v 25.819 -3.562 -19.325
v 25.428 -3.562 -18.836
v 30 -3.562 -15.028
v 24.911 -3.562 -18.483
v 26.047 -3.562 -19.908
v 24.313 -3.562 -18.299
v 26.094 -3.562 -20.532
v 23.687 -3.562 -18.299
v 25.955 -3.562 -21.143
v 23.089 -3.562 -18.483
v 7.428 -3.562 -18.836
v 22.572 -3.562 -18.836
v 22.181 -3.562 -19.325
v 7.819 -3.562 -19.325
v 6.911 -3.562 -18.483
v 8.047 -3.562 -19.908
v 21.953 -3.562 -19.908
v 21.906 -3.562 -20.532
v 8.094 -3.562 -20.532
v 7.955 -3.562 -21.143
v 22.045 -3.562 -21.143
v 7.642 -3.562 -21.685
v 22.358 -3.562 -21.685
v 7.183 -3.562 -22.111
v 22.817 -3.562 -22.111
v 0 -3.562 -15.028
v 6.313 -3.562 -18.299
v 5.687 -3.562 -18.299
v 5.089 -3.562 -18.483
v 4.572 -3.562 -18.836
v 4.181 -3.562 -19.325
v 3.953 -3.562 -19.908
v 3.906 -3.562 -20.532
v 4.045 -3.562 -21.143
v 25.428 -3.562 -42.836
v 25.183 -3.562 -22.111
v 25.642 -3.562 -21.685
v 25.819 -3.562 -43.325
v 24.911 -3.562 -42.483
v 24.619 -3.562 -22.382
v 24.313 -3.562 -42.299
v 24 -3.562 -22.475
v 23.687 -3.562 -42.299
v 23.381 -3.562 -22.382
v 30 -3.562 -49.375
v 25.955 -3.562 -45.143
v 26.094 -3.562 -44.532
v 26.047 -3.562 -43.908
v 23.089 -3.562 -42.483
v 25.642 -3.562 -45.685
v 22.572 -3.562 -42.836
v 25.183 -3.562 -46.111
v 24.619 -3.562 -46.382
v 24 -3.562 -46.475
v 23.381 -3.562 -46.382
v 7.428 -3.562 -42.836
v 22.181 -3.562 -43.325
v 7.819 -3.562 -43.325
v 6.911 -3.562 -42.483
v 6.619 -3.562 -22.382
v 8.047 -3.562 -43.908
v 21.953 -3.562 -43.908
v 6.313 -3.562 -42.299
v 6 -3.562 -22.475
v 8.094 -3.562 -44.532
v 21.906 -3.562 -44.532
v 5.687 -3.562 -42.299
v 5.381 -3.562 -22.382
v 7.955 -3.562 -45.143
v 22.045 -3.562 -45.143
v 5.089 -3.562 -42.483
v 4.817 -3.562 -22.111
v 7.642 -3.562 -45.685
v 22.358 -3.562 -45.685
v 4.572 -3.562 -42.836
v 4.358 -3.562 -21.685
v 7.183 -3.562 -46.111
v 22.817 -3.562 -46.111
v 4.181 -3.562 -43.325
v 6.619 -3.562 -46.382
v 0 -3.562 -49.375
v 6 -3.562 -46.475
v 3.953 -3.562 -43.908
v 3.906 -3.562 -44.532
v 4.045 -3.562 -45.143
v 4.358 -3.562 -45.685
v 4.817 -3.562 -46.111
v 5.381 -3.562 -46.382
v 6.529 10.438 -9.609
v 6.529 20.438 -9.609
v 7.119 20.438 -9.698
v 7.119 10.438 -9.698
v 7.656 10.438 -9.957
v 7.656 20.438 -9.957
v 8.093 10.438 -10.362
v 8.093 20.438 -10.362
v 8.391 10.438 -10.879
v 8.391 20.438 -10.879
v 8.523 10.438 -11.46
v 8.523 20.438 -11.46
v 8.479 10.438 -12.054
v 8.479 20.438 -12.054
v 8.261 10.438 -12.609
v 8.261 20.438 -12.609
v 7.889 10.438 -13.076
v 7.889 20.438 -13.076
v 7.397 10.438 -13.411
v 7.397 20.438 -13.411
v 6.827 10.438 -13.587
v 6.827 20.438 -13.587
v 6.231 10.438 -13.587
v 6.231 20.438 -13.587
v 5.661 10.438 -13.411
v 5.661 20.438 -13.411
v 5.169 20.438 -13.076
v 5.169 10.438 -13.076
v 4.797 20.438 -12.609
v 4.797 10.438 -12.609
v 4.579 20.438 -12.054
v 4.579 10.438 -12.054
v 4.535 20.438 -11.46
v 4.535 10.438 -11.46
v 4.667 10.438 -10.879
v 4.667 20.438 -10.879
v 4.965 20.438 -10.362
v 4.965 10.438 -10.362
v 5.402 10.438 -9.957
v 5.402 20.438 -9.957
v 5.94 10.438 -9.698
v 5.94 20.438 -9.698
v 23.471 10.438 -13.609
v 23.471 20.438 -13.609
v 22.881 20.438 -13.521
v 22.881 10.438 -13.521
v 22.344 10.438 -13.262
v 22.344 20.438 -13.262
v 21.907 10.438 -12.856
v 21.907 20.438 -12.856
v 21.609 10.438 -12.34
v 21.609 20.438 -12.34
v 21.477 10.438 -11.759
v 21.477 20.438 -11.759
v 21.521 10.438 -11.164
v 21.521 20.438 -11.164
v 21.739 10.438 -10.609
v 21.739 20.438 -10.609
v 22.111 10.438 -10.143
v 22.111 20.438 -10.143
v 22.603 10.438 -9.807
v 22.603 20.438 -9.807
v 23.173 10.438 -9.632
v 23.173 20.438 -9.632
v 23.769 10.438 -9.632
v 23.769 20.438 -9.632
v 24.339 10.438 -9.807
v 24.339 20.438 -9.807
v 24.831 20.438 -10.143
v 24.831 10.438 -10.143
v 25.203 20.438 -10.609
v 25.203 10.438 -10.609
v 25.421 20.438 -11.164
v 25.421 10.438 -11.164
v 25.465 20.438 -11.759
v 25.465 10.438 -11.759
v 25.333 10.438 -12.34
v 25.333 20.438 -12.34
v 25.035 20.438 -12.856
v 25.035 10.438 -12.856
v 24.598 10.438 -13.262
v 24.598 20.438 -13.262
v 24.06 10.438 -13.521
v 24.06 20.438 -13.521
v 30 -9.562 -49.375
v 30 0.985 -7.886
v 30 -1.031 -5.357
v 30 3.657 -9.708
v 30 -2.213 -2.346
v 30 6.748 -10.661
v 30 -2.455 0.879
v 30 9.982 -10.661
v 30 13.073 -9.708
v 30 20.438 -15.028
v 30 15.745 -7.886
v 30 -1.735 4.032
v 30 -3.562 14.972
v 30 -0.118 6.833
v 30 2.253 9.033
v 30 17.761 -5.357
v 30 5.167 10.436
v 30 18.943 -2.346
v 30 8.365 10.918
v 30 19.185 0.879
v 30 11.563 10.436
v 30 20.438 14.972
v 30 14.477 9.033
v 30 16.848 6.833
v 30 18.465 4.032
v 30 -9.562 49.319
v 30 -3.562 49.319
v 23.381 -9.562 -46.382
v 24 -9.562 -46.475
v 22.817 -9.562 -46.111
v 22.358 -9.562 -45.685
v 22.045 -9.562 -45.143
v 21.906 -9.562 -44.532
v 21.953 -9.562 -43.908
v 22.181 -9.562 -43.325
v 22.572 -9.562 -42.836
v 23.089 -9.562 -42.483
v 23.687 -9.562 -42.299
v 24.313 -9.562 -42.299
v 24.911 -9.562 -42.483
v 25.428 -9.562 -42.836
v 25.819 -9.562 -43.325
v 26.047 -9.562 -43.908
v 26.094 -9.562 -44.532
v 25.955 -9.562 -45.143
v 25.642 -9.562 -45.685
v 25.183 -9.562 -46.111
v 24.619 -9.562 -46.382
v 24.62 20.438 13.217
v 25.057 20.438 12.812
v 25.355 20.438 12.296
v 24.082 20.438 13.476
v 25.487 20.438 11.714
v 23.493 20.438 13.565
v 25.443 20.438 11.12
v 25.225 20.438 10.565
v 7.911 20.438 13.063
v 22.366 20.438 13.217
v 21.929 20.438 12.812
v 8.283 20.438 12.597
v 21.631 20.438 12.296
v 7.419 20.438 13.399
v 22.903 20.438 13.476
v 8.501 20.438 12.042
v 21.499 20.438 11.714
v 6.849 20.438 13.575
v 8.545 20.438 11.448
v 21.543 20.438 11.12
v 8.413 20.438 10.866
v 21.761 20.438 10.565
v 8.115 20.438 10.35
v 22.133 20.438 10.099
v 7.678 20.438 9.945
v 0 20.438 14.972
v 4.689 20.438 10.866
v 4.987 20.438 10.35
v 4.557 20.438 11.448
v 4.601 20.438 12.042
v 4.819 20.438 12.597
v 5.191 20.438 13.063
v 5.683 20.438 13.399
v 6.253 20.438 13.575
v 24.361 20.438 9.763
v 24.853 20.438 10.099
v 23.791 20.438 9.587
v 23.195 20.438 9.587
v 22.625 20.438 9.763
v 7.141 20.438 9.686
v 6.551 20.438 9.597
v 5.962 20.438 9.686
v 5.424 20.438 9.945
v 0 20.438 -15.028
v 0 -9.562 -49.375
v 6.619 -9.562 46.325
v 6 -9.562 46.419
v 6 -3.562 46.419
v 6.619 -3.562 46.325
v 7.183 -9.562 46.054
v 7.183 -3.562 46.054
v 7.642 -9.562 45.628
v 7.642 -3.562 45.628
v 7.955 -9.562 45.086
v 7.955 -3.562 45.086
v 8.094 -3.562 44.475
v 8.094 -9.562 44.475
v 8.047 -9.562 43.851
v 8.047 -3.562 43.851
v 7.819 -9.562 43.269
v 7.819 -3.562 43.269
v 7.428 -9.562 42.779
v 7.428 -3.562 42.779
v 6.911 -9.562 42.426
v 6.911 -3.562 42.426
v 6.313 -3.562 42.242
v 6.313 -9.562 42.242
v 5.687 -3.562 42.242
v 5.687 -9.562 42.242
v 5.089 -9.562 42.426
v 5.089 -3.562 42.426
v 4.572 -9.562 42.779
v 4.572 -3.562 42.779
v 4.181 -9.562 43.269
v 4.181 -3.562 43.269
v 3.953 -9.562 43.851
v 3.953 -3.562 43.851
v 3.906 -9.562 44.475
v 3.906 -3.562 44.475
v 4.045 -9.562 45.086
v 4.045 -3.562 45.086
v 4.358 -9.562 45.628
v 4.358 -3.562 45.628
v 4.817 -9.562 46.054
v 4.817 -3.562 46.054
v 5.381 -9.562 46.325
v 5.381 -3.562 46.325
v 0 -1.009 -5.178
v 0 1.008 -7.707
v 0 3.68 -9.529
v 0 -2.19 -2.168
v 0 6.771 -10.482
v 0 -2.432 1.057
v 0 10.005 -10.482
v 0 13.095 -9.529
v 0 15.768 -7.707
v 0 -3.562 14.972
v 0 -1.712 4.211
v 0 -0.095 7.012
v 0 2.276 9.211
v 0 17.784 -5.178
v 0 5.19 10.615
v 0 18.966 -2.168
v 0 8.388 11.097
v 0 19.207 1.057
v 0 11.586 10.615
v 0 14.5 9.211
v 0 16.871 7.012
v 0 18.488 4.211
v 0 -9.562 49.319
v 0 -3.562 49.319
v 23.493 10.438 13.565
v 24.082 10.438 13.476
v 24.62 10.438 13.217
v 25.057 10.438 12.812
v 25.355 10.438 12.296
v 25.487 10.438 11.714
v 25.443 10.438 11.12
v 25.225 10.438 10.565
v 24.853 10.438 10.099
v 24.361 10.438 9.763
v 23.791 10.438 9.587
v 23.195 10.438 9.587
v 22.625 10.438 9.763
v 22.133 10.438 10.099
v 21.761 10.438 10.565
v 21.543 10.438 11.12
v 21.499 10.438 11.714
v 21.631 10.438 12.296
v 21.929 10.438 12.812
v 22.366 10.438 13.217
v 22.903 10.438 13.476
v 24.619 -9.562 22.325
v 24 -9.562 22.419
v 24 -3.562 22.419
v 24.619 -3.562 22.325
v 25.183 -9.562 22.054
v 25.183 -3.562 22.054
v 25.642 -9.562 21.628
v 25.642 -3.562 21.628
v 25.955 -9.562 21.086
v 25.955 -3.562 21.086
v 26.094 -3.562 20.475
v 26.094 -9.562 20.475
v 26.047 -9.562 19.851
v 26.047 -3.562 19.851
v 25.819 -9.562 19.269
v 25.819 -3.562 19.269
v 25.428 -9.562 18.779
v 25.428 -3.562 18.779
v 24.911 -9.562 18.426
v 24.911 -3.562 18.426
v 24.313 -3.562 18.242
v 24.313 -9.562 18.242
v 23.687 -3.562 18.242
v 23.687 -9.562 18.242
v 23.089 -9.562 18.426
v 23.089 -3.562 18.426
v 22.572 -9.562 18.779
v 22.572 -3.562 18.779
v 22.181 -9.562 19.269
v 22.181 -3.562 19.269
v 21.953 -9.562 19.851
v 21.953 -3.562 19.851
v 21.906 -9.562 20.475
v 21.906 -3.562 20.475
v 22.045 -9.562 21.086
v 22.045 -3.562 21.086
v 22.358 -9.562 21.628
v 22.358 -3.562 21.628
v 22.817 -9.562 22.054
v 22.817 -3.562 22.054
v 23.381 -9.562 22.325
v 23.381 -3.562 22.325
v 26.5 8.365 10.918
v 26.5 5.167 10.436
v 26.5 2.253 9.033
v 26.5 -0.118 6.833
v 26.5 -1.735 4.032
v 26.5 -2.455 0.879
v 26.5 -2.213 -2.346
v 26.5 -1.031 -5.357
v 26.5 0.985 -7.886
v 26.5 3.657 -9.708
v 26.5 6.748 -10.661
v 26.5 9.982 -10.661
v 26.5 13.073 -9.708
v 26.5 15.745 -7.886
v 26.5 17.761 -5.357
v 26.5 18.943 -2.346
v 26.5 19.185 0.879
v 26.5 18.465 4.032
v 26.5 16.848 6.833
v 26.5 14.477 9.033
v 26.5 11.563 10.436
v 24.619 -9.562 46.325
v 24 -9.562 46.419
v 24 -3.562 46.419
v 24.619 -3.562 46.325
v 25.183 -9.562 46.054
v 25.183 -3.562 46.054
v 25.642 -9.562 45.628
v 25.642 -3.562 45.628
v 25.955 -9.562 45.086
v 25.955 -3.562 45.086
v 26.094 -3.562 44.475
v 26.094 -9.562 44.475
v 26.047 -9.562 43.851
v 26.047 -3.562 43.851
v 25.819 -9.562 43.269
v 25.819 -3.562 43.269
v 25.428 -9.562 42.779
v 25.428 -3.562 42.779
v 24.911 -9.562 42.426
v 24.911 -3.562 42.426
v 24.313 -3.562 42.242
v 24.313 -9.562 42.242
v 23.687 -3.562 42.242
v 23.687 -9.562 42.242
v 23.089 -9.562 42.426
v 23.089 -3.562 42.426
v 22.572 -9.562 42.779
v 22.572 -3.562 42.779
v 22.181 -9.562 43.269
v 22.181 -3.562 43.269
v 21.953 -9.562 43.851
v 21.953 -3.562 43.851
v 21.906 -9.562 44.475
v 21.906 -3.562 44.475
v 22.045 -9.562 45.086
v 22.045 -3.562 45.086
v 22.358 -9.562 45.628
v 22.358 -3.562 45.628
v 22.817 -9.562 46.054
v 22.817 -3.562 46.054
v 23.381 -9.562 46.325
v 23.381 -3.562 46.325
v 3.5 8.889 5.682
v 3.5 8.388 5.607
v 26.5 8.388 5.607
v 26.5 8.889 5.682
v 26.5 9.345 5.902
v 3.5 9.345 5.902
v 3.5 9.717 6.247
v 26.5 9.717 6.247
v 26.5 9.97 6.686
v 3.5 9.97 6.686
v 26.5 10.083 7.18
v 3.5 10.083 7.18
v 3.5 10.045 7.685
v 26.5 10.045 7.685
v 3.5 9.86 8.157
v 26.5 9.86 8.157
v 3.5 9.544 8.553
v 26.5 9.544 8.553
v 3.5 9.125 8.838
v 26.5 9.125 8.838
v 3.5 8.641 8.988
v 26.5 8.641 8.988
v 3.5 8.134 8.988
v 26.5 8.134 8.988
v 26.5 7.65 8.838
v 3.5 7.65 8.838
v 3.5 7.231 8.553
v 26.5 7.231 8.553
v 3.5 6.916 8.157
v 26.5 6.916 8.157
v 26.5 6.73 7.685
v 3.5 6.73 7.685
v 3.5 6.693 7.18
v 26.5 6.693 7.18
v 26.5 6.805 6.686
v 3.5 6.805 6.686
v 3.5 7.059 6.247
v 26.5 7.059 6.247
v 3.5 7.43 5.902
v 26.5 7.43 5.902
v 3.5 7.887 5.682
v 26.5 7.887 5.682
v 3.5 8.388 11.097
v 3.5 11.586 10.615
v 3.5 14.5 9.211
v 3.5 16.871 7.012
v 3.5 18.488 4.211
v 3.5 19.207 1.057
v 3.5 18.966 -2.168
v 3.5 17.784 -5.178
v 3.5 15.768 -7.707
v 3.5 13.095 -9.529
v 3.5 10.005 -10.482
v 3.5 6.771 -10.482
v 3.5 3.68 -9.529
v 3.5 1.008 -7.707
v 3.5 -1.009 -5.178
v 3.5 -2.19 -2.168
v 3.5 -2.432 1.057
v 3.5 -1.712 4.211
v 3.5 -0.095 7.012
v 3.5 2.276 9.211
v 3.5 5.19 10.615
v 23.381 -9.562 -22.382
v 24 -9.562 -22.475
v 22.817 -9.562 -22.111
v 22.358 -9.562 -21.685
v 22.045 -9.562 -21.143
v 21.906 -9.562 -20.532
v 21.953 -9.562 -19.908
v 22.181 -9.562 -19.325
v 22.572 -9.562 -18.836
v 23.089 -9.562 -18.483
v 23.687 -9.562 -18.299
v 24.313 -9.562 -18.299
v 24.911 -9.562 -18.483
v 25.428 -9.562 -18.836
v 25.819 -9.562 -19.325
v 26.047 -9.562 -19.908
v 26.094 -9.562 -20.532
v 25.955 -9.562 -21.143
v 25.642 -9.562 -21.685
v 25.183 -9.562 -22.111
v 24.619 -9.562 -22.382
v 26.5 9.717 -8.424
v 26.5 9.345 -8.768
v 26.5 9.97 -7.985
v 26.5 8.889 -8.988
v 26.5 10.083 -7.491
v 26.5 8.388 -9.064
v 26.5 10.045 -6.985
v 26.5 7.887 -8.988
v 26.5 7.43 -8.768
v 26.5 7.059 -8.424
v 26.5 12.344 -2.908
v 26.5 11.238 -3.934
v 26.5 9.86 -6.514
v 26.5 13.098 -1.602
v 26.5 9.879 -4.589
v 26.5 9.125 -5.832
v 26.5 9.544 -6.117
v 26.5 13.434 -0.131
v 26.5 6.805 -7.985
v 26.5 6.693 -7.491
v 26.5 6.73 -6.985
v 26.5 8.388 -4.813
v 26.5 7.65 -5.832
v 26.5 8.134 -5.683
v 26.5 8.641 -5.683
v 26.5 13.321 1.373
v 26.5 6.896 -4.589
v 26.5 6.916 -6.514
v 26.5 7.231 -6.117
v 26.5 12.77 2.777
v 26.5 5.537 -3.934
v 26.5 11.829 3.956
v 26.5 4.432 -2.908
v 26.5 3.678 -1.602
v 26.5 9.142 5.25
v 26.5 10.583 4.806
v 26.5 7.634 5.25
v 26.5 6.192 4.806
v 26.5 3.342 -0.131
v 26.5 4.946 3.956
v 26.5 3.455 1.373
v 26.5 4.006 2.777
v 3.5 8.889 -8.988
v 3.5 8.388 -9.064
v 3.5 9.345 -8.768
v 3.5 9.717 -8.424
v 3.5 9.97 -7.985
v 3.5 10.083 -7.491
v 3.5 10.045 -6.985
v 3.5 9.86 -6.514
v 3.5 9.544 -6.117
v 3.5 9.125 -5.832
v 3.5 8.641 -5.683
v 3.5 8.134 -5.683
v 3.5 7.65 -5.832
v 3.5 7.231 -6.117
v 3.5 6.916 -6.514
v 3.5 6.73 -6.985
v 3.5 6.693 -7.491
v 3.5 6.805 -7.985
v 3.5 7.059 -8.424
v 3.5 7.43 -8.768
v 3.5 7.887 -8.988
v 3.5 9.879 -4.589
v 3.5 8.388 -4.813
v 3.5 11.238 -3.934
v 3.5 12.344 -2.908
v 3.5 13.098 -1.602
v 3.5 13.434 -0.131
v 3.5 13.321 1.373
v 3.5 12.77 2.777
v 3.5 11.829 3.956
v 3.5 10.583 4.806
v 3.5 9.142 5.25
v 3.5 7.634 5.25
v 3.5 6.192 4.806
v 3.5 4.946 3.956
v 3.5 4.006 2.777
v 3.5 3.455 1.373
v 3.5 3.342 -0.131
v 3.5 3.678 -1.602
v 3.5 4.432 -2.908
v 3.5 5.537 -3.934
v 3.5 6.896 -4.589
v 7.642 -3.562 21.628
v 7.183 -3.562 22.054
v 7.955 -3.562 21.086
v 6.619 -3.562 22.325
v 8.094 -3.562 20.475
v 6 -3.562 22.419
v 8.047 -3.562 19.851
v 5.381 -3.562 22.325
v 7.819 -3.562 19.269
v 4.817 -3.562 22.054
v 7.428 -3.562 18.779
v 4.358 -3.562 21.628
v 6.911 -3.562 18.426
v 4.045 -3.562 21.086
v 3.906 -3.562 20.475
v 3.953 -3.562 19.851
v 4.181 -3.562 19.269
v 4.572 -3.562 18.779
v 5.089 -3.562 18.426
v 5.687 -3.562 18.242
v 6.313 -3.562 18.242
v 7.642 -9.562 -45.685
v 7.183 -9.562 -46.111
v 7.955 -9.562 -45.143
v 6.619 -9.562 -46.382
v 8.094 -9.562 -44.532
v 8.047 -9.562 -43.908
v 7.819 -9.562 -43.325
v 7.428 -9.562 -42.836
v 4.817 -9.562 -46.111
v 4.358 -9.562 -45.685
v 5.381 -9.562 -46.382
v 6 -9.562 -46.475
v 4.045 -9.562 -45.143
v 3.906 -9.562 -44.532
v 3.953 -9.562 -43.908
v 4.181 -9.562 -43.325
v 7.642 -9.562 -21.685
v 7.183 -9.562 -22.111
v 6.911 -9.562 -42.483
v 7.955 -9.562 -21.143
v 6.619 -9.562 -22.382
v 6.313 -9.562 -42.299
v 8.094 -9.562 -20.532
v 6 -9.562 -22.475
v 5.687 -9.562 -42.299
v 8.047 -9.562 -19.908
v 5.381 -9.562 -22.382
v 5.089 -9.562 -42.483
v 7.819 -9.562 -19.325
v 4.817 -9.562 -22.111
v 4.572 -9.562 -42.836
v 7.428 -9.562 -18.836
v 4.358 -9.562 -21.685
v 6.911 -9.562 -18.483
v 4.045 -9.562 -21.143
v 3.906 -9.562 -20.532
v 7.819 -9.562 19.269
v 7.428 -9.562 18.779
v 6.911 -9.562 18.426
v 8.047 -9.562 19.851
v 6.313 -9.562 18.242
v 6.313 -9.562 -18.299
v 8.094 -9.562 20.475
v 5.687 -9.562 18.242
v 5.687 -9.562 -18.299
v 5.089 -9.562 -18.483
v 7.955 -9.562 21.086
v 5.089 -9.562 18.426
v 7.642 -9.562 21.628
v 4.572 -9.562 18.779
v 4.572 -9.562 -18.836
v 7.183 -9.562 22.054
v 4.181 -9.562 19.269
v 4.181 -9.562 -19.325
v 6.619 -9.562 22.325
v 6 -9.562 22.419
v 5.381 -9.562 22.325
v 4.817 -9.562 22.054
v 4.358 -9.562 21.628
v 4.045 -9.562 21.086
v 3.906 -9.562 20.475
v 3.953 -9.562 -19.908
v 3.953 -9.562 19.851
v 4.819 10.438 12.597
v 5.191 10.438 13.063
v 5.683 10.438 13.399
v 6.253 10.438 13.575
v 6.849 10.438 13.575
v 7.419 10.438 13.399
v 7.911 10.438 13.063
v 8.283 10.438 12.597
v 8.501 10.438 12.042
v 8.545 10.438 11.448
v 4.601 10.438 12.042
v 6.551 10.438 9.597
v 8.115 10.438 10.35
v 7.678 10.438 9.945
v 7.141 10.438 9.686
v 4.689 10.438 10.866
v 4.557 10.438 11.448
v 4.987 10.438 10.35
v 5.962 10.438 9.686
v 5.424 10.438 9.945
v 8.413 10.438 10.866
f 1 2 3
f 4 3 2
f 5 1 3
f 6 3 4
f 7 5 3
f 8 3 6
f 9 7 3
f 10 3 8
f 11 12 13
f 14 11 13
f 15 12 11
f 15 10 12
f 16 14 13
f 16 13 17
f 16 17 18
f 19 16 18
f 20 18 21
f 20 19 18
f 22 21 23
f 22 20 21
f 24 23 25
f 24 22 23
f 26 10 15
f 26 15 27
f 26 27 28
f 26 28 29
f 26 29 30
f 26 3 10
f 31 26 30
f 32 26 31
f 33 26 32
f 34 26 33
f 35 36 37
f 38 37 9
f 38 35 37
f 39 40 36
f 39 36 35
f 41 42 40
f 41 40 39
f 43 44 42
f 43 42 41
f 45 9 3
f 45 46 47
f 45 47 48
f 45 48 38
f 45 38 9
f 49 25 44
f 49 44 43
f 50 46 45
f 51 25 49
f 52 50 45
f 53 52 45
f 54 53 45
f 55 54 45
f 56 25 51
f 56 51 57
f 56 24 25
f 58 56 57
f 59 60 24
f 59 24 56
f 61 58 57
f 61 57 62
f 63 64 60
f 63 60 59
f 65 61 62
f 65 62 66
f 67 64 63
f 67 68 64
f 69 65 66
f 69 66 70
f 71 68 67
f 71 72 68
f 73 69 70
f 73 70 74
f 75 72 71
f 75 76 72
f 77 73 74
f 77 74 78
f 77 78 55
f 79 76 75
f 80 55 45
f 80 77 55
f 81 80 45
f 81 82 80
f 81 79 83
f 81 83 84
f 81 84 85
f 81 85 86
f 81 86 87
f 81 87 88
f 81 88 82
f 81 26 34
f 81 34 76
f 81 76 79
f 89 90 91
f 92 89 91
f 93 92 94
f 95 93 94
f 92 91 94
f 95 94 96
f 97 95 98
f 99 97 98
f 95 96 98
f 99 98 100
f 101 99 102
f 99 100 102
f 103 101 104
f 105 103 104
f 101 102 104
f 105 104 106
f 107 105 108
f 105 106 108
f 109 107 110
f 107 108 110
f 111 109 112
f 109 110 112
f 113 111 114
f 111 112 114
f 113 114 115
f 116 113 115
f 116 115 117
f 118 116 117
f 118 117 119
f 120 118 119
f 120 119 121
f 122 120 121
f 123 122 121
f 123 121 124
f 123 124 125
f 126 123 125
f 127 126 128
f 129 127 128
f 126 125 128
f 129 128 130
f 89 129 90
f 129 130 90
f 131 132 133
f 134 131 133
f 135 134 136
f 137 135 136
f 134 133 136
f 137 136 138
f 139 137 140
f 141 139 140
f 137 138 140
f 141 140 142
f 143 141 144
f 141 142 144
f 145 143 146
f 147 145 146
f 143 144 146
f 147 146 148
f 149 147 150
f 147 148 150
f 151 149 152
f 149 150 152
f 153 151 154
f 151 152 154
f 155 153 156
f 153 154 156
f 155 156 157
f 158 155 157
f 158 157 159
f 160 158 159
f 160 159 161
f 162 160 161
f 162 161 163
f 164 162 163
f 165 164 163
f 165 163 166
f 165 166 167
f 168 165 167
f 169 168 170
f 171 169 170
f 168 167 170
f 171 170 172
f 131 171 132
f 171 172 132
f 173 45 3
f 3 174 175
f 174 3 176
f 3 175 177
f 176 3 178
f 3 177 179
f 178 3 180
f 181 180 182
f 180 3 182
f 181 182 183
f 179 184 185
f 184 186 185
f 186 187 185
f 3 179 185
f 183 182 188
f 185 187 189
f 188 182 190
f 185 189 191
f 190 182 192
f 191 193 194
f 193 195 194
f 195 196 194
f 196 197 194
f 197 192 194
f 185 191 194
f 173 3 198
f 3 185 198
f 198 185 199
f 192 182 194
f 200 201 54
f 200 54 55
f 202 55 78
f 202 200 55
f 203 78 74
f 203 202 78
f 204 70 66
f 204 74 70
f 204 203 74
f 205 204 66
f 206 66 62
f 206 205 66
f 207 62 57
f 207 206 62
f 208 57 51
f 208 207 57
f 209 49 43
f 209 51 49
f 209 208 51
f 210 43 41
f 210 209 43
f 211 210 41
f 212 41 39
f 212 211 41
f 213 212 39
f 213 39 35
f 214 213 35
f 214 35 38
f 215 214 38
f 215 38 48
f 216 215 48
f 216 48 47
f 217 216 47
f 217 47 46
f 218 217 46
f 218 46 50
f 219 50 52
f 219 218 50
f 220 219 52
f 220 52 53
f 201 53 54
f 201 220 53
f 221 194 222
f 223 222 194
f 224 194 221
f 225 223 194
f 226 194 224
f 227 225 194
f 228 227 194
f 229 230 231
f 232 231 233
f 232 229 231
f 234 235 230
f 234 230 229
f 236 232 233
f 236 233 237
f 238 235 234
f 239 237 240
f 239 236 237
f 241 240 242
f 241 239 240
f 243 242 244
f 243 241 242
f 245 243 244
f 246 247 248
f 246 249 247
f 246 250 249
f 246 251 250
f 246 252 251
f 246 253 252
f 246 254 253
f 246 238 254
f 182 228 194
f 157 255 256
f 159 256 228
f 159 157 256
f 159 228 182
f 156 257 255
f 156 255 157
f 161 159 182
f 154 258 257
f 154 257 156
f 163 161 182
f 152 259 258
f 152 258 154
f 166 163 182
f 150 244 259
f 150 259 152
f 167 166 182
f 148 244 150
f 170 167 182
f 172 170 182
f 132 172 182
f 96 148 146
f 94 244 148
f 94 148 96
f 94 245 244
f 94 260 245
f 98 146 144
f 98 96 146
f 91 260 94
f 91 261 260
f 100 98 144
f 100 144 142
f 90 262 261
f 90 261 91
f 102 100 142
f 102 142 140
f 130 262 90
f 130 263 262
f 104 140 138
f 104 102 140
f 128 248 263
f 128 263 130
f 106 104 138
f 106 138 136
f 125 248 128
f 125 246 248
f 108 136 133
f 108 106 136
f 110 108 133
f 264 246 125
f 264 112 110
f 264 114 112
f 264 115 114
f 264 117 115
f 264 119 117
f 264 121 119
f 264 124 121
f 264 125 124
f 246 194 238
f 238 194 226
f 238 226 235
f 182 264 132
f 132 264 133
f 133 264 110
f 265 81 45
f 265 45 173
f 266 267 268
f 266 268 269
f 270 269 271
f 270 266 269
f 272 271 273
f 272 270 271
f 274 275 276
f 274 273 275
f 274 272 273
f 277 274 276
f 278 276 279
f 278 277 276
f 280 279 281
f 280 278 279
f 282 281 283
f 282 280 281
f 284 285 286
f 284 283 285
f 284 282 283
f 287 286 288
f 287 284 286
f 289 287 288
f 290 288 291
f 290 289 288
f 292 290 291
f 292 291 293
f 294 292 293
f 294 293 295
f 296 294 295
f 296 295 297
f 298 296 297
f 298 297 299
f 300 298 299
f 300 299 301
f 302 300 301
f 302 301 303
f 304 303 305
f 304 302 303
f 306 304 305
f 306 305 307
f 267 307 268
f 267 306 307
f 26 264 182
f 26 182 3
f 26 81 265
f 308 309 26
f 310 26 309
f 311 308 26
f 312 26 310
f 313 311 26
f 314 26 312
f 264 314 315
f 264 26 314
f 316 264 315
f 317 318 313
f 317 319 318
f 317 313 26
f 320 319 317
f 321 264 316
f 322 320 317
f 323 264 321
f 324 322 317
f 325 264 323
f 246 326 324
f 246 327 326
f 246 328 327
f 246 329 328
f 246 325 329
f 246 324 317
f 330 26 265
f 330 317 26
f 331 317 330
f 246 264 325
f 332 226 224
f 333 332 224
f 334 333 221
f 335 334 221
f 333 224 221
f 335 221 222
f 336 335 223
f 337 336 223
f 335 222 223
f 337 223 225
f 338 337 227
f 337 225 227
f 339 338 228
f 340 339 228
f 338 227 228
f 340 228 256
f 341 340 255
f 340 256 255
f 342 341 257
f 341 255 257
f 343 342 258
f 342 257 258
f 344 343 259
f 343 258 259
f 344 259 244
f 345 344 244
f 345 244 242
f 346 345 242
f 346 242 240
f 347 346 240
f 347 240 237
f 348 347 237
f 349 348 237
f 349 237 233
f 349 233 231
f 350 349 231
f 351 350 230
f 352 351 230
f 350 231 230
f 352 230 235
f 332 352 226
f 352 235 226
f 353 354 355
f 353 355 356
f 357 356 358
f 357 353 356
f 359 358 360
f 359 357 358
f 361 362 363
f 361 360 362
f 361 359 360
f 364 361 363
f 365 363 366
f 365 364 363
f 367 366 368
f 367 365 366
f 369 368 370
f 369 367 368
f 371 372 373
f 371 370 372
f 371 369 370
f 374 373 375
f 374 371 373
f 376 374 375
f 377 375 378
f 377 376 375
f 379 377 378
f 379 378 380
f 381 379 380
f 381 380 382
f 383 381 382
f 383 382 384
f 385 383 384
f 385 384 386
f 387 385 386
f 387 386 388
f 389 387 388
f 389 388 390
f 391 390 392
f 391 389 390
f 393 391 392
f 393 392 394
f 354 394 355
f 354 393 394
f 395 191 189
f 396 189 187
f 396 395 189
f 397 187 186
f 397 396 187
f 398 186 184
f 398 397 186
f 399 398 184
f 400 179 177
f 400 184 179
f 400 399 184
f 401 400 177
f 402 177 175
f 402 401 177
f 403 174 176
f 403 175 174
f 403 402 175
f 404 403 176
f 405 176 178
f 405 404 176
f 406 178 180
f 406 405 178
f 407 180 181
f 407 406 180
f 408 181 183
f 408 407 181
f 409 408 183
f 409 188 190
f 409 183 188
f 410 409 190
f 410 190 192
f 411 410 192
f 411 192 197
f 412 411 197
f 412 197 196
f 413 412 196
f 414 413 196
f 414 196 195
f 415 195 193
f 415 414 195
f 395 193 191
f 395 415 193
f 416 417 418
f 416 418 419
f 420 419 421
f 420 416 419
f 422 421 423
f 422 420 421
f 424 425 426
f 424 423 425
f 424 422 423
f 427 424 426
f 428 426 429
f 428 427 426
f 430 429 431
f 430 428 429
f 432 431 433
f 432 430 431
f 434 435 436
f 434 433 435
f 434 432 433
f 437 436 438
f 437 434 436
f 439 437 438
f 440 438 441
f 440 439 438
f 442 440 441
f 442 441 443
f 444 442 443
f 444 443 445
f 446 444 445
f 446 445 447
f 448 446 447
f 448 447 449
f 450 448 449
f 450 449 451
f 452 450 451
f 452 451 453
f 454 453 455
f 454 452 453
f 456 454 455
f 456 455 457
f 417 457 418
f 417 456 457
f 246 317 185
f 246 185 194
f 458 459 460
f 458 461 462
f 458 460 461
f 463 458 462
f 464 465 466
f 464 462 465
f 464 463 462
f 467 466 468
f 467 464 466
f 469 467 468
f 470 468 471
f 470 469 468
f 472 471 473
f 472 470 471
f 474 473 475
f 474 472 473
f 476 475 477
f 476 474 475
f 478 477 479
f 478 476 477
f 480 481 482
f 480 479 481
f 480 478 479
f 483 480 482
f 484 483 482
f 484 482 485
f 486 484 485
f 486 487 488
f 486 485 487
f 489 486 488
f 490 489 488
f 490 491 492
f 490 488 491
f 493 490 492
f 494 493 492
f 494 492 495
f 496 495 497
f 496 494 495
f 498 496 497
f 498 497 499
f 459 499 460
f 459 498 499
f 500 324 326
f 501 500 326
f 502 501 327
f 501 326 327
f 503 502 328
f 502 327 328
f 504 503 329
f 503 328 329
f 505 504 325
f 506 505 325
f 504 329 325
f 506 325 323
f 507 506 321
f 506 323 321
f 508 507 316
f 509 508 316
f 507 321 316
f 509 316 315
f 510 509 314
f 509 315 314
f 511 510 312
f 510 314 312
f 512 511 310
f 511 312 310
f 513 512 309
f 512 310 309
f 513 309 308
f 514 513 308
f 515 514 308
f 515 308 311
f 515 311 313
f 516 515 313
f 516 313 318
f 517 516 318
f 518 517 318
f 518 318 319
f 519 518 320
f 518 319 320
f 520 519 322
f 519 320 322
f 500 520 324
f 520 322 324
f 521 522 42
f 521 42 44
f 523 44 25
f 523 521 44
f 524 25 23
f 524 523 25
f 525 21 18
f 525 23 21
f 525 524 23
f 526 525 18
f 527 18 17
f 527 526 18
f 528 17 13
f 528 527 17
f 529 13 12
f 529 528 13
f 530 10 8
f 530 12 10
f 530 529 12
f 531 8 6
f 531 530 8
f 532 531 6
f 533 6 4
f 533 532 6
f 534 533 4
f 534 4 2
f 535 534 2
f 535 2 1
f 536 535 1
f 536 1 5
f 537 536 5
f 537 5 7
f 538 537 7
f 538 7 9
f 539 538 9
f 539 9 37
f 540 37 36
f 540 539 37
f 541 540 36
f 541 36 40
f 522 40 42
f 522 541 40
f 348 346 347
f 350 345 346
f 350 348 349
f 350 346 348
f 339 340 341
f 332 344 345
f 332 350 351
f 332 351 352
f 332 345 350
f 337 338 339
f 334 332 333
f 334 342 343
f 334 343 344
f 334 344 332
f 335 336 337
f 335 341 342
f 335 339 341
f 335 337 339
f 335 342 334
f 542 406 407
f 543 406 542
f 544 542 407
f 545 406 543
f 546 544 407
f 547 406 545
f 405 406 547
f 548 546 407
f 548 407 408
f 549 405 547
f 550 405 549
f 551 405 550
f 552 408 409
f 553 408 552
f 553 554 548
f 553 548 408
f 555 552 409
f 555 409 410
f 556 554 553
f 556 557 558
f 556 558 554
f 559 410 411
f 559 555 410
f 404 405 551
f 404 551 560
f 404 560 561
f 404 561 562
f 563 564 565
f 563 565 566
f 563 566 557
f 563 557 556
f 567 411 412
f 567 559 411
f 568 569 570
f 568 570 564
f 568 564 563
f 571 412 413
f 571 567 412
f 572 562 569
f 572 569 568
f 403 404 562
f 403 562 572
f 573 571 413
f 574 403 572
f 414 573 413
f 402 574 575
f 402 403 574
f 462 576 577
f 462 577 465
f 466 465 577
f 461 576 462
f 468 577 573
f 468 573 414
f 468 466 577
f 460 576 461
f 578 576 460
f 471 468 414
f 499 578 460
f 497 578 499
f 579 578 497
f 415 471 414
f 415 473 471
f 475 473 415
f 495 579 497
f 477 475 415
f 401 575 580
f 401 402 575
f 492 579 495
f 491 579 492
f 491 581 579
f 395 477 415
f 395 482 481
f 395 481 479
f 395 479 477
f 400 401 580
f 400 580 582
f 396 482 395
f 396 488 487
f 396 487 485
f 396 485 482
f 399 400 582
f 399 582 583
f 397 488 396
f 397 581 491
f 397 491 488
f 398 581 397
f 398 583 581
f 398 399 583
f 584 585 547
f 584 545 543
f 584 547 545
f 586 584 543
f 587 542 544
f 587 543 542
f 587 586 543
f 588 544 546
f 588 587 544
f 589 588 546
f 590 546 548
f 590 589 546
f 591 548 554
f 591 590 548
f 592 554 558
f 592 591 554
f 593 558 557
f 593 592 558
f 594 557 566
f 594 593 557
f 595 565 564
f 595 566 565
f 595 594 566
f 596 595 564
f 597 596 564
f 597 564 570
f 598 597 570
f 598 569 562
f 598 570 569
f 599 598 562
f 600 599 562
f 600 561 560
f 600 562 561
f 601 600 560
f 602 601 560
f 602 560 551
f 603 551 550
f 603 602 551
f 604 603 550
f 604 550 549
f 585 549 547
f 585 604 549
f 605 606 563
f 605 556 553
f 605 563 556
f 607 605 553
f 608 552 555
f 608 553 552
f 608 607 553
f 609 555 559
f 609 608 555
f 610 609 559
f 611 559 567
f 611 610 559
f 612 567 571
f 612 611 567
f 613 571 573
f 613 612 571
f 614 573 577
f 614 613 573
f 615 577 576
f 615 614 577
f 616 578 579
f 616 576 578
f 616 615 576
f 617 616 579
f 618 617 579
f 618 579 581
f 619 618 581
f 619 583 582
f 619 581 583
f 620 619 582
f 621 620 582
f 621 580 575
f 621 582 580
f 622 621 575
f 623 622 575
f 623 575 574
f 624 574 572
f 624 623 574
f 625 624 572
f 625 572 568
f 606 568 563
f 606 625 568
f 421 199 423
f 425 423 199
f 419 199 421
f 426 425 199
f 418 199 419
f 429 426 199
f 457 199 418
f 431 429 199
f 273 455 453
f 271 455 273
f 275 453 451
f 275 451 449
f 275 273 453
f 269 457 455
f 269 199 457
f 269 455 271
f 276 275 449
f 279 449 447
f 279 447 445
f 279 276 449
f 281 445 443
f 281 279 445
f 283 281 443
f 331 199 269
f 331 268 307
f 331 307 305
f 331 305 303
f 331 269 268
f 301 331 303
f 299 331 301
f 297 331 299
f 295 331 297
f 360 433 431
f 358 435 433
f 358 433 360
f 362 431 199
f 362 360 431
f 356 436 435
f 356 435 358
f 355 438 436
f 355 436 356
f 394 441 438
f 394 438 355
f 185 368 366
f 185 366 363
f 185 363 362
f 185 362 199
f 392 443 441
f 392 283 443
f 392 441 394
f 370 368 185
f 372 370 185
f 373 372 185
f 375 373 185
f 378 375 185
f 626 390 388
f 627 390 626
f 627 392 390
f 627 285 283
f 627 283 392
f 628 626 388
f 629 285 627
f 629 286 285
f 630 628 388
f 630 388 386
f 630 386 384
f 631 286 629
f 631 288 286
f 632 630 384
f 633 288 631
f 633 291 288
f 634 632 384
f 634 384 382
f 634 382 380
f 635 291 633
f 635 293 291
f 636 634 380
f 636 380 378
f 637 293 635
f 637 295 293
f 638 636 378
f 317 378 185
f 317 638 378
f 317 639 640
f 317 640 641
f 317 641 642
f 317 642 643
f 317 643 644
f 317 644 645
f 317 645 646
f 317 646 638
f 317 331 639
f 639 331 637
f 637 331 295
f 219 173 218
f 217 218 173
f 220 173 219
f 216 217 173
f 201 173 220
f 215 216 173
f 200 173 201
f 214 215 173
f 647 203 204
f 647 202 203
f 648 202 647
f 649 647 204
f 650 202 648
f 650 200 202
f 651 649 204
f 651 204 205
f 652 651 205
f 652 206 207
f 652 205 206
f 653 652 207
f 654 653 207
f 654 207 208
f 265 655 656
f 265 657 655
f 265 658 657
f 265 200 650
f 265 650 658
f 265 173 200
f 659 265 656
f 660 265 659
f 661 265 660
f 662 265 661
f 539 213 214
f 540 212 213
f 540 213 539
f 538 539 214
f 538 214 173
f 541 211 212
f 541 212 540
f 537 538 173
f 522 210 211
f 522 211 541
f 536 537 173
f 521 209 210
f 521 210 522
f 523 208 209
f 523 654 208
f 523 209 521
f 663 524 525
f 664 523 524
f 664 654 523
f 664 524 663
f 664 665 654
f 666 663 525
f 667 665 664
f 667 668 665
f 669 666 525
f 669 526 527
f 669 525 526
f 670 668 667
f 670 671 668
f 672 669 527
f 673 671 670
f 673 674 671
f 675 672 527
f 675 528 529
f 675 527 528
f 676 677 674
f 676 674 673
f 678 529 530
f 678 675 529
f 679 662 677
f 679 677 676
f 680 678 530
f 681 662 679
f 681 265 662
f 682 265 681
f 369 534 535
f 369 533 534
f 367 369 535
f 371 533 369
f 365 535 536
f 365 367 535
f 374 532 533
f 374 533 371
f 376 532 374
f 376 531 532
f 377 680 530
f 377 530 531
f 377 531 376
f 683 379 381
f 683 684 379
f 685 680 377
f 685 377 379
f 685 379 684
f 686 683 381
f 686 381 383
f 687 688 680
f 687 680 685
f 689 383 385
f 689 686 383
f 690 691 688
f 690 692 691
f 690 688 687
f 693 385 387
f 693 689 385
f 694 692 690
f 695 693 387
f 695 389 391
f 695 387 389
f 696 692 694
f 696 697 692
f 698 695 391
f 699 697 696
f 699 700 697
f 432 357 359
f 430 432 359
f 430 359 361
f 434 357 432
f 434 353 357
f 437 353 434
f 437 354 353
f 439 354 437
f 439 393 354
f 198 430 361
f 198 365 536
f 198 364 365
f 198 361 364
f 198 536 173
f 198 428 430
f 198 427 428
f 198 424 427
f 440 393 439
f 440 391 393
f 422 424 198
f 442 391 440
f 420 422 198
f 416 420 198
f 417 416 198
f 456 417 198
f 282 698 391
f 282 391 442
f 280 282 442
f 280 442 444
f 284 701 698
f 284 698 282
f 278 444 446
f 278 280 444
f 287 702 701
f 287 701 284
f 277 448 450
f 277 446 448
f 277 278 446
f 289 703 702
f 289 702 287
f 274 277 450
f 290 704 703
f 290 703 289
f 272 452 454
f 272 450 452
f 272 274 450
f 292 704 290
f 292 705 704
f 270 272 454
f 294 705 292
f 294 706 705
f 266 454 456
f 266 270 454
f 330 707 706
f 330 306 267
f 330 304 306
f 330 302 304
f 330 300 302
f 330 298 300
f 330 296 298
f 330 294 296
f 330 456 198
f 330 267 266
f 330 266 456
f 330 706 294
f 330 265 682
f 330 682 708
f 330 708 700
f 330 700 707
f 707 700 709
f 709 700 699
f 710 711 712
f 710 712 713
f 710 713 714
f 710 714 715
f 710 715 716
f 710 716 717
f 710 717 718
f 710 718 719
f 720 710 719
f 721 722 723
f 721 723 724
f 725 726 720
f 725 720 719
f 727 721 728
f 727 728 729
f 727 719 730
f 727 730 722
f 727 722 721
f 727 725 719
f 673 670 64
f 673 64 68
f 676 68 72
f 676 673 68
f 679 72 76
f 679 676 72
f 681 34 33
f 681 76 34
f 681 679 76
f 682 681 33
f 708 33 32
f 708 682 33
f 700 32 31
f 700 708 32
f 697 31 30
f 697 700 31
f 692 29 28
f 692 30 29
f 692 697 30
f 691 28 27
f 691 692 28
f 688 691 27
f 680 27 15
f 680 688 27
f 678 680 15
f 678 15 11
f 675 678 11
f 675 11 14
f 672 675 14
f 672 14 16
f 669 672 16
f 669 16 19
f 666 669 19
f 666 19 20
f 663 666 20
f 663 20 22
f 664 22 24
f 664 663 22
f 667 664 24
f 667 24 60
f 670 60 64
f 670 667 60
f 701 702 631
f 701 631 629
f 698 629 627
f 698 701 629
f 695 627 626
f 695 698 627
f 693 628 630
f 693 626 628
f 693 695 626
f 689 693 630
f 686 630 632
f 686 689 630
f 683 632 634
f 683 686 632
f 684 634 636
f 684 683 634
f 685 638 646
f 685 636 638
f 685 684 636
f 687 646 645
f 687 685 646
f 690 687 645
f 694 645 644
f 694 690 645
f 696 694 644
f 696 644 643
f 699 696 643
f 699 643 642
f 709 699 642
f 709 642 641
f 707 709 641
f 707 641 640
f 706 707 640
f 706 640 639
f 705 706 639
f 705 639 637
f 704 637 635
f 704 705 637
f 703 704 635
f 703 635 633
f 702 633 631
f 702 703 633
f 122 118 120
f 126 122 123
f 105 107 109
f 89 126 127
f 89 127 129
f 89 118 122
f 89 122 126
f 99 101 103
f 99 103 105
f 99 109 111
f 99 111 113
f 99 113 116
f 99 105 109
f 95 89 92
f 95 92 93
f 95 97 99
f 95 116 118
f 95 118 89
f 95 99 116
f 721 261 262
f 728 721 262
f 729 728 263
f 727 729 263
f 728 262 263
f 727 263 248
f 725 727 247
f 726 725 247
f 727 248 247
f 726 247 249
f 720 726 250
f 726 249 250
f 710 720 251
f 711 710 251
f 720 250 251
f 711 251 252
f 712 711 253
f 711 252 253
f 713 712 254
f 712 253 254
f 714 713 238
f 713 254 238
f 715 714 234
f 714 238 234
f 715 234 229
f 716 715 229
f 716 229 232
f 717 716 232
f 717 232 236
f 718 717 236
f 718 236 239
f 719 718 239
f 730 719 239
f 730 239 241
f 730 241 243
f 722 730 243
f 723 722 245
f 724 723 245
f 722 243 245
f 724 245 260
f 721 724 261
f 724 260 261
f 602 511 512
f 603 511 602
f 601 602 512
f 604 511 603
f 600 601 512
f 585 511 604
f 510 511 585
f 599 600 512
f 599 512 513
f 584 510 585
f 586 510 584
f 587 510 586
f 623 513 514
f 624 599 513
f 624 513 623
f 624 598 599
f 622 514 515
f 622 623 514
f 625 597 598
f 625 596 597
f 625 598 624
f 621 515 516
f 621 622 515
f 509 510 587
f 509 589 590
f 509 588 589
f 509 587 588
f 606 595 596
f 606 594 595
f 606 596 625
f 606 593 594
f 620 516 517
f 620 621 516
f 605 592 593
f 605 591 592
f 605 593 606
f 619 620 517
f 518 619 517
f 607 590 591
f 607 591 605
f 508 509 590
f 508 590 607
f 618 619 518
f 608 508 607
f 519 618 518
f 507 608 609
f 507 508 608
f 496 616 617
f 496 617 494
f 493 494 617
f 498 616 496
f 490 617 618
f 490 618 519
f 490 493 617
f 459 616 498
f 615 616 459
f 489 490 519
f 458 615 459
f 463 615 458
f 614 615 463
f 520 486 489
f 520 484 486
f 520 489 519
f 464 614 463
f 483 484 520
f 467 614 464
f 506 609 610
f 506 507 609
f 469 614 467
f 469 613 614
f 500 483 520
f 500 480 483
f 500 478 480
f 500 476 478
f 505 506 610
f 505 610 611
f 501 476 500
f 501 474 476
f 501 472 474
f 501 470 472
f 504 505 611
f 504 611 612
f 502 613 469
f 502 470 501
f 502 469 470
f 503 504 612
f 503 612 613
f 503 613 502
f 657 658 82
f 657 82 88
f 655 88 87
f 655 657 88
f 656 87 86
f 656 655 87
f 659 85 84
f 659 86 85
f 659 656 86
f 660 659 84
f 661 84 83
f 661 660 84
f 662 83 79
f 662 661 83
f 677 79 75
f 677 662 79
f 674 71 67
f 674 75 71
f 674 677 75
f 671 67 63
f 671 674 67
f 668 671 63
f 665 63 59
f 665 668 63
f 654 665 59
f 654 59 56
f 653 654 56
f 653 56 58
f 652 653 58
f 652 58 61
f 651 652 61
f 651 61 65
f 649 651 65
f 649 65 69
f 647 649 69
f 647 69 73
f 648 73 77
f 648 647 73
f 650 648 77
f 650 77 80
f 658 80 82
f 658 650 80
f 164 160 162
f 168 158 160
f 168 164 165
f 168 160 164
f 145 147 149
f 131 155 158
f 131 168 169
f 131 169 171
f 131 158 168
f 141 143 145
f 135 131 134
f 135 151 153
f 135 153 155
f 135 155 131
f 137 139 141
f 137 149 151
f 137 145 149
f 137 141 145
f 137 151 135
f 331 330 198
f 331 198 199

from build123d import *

# Parameters (mm, degrees)
SKETCH_1_R               = 5.06
SKETCH_1_R_2             = 1.7
EXTRUDE_2_DEPTH          = 30
CUT_EXTRUDE_1_DEPTH      = 63.561467357
CUT_EXTRUDE_1_DEPTH_BACK = 63.561467357
SKETCH_3_R               = 2.1
CUT_EXTRUDE_2_DEPTH      = 62.283268979
CUT_EXTRUDE_2_DEPTH_BACK = 3.5
SKETCH_6_R               = 10.85
SKETCH_7_R               = 10.85
CUT_EXTRUDE_3_DEPTH      = 3.5
SKETCH_8_R               = 2
CUT_EXTRUDE_4_DEPTH      = 10


with BuildPart() as part:
    # Эскиз1 → Бобышка-Вытянуть2 (new body)
    with BuildSketch(Plane(origin=(0, 0, 0), x_dir=(0, 0, -1), z_dir=(1, 0, 0))):
        Polygon((15.028471622, 20.43775572), (15.028471622, -3.56224428), (49.375471622, -3.56224428), (49.375471622, -9.56224428), (-49.318528378, -9.56224428), (-49.318528378, -3.56224428), (-14.971528378, -3.56224428), (-14.971528378, 20.43775572), align=None)
        with Locations((-0.246661602, 8.38775572)):
            Circle(SKETCH_1_R, mode=Mode.SUBTRACT)
        with Locations((7.363604846, 8.38775572)):
            Circle(SKETCH_1_R_2, mode=Mode.SUBTRACT)
        with Locations((-7.306661602, 8.38775572)):
            Circle(SKETCH_1_R_2, mode=Mode.SUBTRACT)
    extrude(amount=EXTRUDE_2_DEPTH)

    # Эскиз3 → Вырез-Вытянуть1 (cut, two sides: drawn at the far end of the back side and taken through both)
    with BuildSketch(Plane(origin=(0, -3.56224428, 0), x_dir=(1, 0, 0), z_dir=(0, 1, 0)).offset(-CUT_EXTRUDE_1_DEPTH_BACK)):
        with Locations(Location((6, -20.318528378, 0), (0, 0, 270))):
            Circle(SKETCH_3_R)
        with Locations(Location((24, -20.318528378, 0), (0, 0, 270))):
            Circle(SKETCH_3_R)
        with Locations(Location((24, -44.318528378, 0), (0, 0, 270))):
            Circle(SKETCH_3_R)
        with Locations(Location((6, -44.318528378, 0), (0, 0, 270))):
            Circle(SKETCH_3_R)
        with Locations(Location((6, 44.375471622, 0), (0, 0, 90))):
            Circle(SKETCH_3_R)
        with Locations(Location((24, 44.375471622, 0), (0, 0, 90))):
            Circle(SKETCH_3_R)
        with Locations(Location((24, 20.375471622, 0), (0, 0, 90))):
            Circle(SKETCH_3_R)
        with Locations(Location((6, 20.375471622, 0), (0, 0, 90))):
            Circle(SKETCH_3_R)
    extrude(amount=CUT_EXTRUDE_1_DEPTH + CUT_EXTRUDE_1_DEPTH_BACK, mode=Mode.SUBTRACT)

    # Эскиз6 → Вырез-Вытянуть2 (cut, two sides: drawn at the far end of the back side and taken through both)
    with BuildSketch(Plane(origin=(30, 0, 0), x_dir=(0, 0, -1), z_dir=(1, 0, 0)).offset(-CUT_EXTRUDE_2_DEPTH_BACK)):
        with Locations(Location((-0.067919336, 8.365106346, 0), (0, 0, 180))):
            Circle(SKETCH_6_R)
    extrude(amount=CUT_EXTRUDE_2_DEPTH + CUT_EXTRUDE_2_DEPTH_BACK, mode=Mode.SUBTRACT)

    # Эскиз7 → Вырез-Вытянуть3 (cut)
    with BuildSketch(Plane.ZY):
        with Locations((0.246661602, 8.38775572)):
            Circle(SKETCH_7_R)
    extrude(amount=-CUT_EXTRUDE_3_DEPTH, mode=Mode.SUBTRACT)

    # Эскиз8 → Вырез-Вытянуть4 (cut)
    with BuildSketch(Plane(origin=(0, 20.43775572, 0), x_dir=(1, 0, 0), z_dir=(0, 1, 0))):
        with Locations(Location((6.529067928, 11.609424623, 0), (0, 0, 270))):
            Circle(SKETCH_8_R)
        with Locations(Location((23.470932072, 11.609424623, 0), (0, 0, 90))):
            Circle(SKETCH_8_R)
        with Locations(Location((23.492925715, -11.564853382, 0), (0, 0, 270))):
            Circle(SKETCH_8_R)
        with Locations(Location((6.55109209, -11.597010844, 0), (0, 0, 90))):
            Circle(SKETCH_8_R)
    extrude(amount=-CUT_EXTRUDE_4_DEPTH, mode=Mode.SUBTRACT)


solid = part.part
